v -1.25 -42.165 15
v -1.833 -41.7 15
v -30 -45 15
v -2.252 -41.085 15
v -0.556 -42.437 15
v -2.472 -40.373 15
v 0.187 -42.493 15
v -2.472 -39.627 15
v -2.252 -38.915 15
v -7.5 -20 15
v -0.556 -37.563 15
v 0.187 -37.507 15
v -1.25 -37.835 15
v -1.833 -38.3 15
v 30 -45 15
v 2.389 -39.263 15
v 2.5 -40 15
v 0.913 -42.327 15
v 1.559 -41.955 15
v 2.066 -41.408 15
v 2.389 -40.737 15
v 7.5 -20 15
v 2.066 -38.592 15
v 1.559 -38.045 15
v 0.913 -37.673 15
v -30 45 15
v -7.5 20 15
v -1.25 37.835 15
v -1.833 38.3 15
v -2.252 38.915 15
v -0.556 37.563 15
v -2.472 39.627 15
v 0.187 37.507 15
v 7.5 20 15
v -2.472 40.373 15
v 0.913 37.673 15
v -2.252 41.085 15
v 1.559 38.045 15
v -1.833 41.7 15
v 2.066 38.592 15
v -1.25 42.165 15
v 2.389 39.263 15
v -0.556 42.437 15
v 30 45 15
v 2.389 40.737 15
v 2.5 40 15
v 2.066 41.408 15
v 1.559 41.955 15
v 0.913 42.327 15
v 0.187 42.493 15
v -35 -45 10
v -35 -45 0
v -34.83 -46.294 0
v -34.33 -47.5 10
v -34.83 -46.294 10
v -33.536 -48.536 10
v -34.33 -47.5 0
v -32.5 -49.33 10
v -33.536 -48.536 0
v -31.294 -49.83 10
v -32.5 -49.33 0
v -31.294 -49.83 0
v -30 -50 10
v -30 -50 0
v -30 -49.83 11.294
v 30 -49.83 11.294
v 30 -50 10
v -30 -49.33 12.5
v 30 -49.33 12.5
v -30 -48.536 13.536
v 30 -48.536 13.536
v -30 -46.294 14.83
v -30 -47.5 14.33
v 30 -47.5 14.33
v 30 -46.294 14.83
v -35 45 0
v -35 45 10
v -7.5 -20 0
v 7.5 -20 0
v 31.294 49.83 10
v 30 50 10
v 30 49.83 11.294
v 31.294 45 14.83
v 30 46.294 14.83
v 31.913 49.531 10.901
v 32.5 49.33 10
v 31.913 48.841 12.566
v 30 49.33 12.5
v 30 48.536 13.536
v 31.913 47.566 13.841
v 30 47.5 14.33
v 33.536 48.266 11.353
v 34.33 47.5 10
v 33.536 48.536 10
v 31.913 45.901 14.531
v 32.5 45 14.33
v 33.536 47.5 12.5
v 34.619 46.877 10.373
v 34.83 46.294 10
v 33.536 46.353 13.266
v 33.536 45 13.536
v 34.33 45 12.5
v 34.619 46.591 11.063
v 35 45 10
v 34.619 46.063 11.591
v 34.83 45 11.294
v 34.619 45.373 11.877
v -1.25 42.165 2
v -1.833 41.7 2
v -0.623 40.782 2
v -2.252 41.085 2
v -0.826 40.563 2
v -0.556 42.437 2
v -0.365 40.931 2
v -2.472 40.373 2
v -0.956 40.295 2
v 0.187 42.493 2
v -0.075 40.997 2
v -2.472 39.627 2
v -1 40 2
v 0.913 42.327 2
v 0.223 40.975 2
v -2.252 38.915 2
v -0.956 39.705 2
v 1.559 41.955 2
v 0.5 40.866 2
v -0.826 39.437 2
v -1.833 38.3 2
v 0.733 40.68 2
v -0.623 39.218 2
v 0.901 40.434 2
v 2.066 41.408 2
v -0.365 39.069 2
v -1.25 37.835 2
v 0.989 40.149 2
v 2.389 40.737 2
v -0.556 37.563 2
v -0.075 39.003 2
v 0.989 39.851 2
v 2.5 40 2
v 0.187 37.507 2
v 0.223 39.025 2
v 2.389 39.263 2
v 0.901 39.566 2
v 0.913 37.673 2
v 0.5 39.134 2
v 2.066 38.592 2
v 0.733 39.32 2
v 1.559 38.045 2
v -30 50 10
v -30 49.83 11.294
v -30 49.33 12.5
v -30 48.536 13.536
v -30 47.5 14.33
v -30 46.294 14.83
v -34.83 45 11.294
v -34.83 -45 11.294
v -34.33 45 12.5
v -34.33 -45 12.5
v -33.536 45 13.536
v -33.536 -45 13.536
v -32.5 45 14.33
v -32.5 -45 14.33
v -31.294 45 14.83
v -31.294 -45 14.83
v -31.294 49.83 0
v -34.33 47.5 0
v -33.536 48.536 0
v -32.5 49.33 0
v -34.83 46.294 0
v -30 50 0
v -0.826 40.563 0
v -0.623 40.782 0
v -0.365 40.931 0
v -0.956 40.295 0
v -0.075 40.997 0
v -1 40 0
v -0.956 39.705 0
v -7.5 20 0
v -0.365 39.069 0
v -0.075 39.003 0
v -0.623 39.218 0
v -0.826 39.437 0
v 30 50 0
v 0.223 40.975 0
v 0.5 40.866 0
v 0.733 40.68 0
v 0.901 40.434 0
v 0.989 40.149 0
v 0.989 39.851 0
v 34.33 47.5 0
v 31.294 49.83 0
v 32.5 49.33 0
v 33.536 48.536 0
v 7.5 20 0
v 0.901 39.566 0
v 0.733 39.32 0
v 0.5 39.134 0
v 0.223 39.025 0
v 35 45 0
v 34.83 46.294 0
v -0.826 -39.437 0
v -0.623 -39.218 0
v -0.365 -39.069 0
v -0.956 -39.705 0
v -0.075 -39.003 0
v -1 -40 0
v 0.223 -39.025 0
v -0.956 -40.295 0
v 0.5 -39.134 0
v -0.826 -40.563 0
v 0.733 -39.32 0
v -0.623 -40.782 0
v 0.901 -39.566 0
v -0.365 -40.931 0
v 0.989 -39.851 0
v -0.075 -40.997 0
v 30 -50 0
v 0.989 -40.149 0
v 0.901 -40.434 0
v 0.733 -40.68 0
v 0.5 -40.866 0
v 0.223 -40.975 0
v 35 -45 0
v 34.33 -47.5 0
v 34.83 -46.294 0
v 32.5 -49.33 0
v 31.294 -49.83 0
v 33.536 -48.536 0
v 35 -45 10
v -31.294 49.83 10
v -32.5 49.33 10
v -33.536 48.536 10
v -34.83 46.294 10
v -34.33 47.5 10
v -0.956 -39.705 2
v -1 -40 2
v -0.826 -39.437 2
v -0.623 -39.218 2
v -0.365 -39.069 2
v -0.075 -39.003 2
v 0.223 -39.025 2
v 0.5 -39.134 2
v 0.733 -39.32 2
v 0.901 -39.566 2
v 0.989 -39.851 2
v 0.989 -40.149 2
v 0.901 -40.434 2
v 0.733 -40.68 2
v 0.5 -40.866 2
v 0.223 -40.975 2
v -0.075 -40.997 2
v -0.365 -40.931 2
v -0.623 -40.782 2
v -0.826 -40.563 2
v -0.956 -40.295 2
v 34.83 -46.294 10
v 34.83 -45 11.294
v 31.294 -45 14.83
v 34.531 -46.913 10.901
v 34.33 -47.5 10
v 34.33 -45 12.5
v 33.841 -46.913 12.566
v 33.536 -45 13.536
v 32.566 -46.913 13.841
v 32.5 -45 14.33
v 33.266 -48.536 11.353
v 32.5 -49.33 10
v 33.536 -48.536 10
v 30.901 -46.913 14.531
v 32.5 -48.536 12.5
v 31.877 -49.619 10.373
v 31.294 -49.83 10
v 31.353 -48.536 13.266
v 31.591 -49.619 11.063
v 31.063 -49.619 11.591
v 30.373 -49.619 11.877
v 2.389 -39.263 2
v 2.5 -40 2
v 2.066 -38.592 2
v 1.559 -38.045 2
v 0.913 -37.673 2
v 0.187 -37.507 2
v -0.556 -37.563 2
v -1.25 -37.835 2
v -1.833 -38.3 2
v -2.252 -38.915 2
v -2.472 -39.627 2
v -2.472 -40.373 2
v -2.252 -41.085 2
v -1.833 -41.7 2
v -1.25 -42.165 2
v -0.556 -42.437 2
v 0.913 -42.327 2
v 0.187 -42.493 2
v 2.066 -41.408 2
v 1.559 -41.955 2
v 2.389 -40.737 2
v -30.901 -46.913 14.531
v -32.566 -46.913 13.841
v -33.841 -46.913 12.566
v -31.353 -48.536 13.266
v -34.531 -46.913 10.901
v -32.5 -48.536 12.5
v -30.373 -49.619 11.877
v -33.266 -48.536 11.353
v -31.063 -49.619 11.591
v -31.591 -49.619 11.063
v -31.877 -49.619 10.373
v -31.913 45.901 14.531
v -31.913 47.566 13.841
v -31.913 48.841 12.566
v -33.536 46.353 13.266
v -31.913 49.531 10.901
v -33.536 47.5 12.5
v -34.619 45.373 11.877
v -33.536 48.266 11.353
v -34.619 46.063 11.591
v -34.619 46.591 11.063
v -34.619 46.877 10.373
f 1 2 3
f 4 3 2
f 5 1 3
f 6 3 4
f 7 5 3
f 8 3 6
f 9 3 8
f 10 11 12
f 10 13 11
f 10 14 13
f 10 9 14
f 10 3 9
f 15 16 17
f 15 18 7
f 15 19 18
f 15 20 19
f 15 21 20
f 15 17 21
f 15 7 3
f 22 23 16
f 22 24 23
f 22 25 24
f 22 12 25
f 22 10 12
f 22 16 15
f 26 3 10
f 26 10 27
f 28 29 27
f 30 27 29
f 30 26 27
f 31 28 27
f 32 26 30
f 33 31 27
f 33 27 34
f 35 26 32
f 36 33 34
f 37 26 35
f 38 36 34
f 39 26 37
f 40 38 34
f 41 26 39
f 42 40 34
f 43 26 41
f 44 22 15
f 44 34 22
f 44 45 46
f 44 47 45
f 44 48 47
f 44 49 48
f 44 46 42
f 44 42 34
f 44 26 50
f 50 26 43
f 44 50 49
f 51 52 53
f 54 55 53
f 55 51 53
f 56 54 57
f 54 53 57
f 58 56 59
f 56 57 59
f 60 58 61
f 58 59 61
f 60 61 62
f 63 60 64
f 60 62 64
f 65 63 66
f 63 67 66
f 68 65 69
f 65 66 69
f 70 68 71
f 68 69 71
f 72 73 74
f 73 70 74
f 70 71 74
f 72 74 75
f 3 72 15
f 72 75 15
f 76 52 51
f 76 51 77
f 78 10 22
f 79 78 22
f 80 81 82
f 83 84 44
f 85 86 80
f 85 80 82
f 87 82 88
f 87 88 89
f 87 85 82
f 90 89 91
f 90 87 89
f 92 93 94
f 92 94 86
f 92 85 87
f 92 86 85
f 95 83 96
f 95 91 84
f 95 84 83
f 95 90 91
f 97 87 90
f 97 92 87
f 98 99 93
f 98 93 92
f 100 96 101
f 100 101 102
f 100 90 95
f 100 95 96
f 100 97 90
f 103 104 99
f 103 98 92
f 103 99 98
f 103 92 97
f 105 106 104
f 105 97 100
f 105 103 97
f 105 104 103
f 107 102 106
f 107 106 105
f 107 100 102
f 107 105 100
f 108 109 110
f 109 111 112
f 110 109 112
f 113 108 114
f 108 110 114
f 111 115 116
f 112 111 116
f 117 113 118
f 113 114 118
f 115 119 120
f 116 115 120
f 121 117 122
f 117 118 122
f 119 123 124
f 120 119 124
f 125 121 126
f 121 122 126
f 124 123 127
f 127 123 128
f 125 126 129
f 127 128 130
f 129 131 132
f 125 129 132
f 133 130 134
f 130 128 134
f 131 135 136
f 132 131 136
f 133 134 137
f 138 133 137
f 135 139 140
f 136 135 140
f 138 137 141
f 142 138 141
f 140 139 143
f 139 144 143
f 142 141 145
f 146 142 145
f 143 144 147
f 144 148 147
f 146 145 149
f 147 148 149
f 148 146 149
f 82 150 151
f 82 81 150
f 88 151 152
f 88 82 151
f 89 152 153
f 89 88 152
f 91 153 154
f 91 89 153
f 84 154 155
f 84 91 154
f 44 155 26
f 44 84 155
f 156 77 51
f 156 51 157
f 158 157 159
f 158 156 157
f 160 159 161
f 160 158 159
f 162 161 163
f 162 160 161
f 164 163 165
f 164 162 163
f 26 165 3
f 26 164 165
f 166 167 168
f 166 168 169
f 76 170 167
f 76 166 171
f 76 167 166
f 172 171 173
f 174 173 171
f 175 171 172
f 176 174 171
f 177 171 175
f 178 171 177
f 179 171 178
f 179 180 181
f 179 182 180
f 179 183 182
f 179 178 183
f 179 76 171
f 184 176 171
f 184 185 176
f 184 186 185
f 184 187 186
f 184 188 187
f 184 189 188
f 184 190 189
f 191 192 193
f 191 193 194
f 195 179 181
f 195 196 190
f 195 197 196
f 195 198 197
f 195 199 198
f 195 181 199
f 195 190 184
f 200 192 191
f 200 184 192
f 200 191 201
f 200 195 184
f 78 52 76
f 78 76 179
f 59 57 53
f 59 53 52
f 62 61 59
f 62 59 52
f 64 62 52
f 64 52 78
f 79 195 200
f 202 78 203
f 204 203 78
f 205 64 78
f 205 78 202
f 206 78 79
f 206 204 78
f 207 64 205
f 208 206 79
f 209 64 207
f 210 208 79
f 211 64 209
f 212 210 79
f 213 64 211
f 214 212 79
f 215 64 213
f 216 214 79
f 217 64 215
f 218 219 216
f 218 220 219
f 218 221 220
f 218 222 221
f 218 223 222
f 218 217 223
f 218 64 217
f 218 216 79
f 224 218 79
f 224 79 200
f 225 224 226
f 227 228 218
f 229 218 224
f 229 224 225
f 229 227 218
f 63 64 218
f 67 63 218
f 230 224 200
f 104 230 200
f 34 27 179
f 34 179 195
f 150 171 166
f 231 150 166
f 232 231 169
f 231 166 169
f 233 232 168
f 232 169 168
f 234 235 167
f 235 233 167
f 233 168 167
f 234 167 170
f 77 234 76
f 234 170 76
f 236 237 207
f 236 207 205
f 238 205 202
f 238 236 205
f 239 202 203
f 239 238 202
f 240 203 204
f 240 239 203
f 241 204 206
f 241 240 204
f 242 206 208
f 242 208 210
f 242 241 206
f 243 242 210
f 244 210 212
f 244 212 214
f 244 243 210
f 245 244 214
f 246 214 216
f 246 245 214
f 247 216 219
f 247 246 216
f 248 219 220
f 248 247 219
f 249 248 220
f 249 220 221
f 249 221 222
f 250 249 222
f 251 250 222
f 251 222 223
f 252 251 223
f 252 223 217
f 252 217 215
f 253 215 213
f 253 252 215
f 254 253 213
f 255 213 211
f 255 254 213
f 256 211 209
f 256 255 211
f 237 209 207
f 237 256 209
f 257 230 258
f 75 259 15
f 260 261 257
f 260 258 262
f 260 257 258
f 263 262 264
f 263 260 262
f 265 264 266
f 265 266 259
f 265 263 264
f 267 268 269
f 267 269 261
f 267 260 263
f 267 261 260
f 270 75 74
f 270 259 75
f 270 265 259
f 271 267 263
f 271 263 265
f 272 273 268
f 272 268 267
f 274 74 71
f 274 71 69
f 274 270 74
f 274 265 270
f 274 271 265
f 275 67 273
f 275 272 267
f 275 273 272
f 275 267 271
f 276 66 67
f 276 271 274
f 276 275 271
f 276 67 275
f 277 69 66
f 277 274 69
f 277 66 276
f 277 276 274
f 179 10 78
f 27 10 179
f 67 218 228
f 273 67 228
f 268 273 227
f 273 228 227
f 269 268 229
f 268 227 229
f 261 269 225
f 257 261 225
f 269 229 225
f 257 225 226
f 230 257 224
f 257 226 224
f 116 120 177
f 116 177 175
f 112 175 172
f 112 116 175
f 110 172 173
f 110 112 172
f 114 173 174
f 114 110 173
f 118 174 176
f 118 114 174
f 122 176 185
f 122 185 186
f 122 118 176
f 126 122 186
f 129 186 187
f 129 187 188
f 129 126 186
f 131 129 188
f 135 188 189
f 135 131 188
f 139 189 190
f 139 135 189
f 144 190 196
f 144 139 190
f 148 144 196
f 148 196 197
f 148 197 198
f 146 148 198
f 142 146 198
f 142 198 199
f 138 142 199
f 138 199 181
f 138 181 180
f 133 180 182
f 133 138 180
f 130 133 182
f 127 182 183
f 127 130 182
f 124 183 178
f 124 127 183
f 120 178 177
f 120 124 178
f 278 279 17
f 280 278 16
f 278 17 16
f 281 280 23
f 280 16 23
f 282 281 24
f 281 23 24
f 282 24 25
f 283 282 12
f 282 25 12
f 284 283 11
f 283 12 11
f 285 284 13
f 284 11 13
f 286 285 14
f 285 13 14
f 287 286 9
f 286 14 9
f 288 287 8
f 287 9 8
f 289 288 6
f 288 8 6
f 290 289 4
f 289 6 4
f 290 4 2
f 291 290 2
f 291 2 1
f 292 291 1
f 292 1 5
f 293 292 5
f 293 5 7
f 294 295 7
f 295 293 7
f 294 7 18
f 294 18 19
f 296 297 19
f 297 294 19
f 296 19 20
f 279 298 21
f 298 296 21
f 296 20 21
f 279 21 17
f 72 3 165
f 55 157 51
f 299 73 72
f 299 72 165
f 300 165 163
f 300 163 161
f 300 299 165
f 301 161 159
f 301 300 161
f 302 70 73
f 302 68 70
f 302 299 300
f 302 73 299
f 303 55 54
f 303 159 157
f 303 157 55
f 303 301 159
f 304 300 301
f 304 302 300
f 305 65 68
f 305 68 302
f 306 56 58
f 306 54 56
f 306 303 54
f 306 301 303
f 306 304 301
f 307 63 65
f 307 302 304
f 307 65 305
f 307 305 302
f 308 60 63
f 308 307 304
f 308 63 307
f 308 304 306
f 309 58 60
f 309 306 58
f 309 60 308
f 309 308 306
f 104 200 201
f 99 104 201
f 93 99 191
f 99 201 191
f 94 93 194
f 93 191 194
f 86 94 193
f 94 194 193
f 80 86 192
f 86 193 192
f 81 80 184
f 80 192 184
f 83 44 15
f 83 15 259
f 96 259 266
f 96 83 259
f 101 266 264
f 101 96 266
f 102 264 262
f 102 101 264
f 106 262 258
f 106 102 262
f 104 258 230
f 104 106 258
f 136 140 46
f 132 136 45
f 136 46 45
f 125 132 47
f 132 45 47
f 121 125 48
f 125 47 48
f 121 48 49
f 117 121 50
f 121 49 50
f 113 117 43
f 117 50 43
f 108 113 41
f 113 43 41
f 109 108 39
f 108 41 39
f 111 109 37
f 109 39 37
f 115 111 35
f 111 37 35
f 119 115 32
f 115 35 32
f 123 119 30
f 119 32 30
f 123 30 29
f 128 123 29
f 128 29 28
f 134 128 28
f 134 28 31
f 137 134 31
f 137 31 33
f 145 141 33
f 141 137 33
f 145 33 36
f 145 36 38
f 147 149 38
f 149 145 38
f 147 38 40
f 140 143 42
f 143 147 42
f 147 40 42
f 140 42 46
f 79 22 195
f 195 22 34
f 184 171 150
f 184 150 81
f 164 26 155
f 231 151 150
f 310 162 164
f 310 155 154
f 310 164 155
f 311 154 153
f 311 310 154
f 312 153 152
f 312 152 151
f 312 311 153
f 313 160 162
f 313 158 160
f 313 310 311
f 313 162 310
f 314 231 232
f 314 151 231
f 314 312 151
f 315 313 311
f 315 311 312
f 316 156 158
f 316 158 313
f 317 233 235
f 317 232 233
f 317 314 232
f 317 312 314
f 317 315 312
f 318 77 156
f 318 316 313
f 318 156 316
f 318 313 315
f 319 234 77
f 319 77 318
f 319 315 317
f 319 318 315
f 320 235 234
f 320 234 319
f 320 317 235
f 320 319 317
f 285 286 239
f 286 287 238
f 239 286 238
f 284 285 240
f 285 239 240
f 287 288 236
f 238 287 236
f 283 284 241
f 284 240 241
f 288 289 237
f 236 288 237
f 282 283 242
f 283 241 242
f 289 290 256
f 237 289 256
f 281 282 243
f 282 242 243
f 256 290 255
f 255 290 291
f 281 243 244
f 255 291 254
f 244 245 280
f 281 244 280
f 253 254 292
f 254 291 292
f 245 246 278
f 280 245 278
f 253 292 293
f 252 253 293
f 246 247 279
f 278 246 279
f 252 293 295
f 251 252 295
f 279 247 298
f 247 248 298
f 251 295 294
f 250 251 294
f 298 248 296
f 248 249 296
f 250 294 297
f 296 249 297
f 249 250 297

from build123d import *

# Parameters (mm, degrees)
SKETCH1_W           = 70
SKETCH1_H           = 100
BOSS_EXTRUDE1_DEPTH = 15
SKETCH3_W           = 15
SKETCH3_H           = 40
CUT_EXTRUDE1_DEPTH  = 63.84902545
SKETCH4_R           = 2.5
CUT_EXTRUDE2_DEPTH  = 63.84902545
FILLET1_R           = 5
BOSS_EXTRUDE2_START = -2
SKETCH5_R           = 2.5
SKETCH5_R_2         = 1
BOSS_EXTRUDE2_DEPTH = 2
FILLET2_R           = 5


with BuildPart() as part:
    # Sketch1 → Boss-Extrude1 (new body)
    with BuildSketch(Plane.XY):
        Rectangle(SKETCH1_W, SKETCH1_H)
    extrude(amount=BOSS_EXTRUDE1_DEPTH)

    # Sketch3 → Cut-Extrude1 (cut, through all)
    with BuildSketch(Plane.XY.offset(15)):
        Rectangle(SKETCH3_W, SKETCH3_H)
    extrude(amount=-CUT_EXTRUDE1_DEPTH, mode=Mode.SUBTRACT)

    # Sketch4 → Cut-Extrude2 (cut, through all)
    with BuildSketch(Plane.XY.offset(15)):
        with Locations((0, -40)):
            Circle(SKETCH4_R)
        with Locations((0, 40)):
            Circle(SKETCH4_R)
    extrude(amount=-CUT_EXTRUDE2_DEPTH, mode=Mode.SUBTRACT)

    # Fillet1
    fillet1_edges = [part.edges().sort_by_distance(p)[0] for p in [
        (-35, 0, 15),
        (0, -50, 15),
        (35, 0, 15),
        (0, 50, 15),
    ]]
    fillet(fillet1_edges, radius=FILLET1_R)

    # Sketch5 → Boss-Extrude2 (add)
    # profile 1 of 2: a face of its own
    with BuildSketch(Plane(origin=(0, 0, 0), x_dir=(-1, 0, 0), z_dir=(0, 0, -1)).offset(BOSS_EXTRUDE2_START)):
        with Locations(Location((0, 40, 0), (0, 0, 180))):
            Circle(SKETCH5_R)
        with Locations((0, 40)):
            Circle(SKETCH5_R_2, mode=Mode.SUBTRACT)
    # profile 2 of 2: a face of its own
    with BuildSketch(Plane(origin=(0, 0, 0), x_dir=(-1, 0, 0), z_dir=(0, 0, -1)).offset(BOSS_EXTRUDE2_START)):
        with Locations(Location((0, -40, 0), (0, 0, 180))):
            Circle(SKETCH5_R)
        with Locations((0, -40)):
            Circle(SKETCH5_R_2, mode=Mode.SUBTRACT)
    extrude(amount=BOSS_EXTRUDE2_DEPTH)

    # Fillet2
    # the kernel refuses this fillet: 5 mm, written as the material it takes off along each edge
    with BuildSketch(Plane(origin=(-30, 45, 10), x_dir=(0, 1, 0), z_dir=(-1, 0, 0))) as fillet2_piece_1_section:
        Polygon((0, 0), (FILLET2_R, 0), (FILLET2_R, -FILLET2_R), (0, -FILLET2_R), align=None)
    fillet2_piece_1 = extrude(amount=FILLET2_R, mode=Mode.PRIVATE)
    fillet2_piece_1 = fillet2_piece_1 - Plane(origin=(-30, 45, 10), x_dir=(0, -0.7071067811865475, -0.7071067811865475), z_dir=(-1, 0, 0)) * Sphere(FILLET2_R, mode=Mode.PRIVATE)
    add(fillet2_piece_1, mode=Mode.SUBTRACT)
    with BuildSketch(Plane(origin=(30, 45, 10), x_dir=(0, 1, 0), z_dir=(1, 0, 0))) as fillet2_piece_2_section:
        Polygon((0, 0), (FILLET2_R, 0), (FILLET2_R, FILLET2_R), (0, FILLET2_R), align=None)
    fillet2_piece_2 = extrude(amount=FILLET2_R, mode=Mode.PRIVATE)
    fillet2_piece_2 = fillet2_piece_2 - Plane(origin=(30, 45, 10), x_dir=(0, -0.7071067811865475, -0.7071067811865475), z_dir=(1, 0, 0)) * Sphere(FILLET2_R, mode=Mode.PRIVATE)
    add(fillet2_piece_2, mode=Mode.SUBTRACT)
    with BuildSketch(Plane(origin=(-30, -45, 10), x_dir=(-1, 0, 0), z_dir=(0, -1, 0))) as fillet2_piece_3_section:
        Polygon((0, 0), (FILLET2_R, 0), (FILLET2_R, -FILLET2_R), (0, -FILLET2_R), align=None)
    fillet2_piece_3 = extrude(amount=FILLET2_R, mode=Mode.PRIVATE)
    fillet2_piece_3 = fillet2_piece_3 - Plane(origin=(-30, -45, 10), x_dir=(0.7071067811865475, 0, -0.7071067811865475), z_dir=(0, -1, 0)) * Sphere(FILLET2_R, mode=Mode.PRIVATE)
    add(fillet2_piece_3, mode=Mode.SUBTRACT)
    with BuildSketch(Plane(origin=(30, -45, 10), x_dir=(1, 0, 0), z_dir=(0, -1, 0))) as fillet2_piece_4_section:
        Polygon((0, 0), (FILLET2_R, 0), (FILLET2_R, FILLET2_R), (0, FILLET2_R), align=None)
    fillet2_piece_4 = extrude(amount=FILLET2_R, mode=Mode.PRIVATE)
    fillet2_piece_4 = fillet2_piece_4 - Plane(origin=(30, -45, 10), x_dir=(-0.7071067811865475, 0, -0.7071067811865475), z_dir=(0, -1, 0)) * Sphere(FILLET2_R, mode=Mode.PRIVATE)
    add(fillet2_piece_4, mode=Mode.SUBTRACT)
    with BuildSketch(Plane(origin=(35, -50, -12.5), x_dir=(-1, 0, 0), z_dir=(0, 0, 1)), Plane(origin=(35, 50, -12.5), x_dir=(0, -1, 0), z_dir=(0, 0, 1))) as fillet2_piece_5:
        with BuildLine():
            CenterArc((FILLET2_R, -FILLET2_R), FILLET2_R, 90, 90)
            Line((0, -FILLET2_R), (0, 0))
            Line((0, 0), (FILLET2_R, 0))
        make_face()
    extrude(amount=22.5, mode=Mode.SUBTRACT)
    with BuildSketch(Plane(origin=(-35, -50, -12.5), x_dir=(1, 0, 0), z_dir=(0, 0, 1)), Plane(origin=(-35, 50, -12.5), x_dir=(0, -1, 0), z_dir=(0, 0, 1))) as fillet2_piece_6:
        with BuildLine():
            CenterArc((FILLET2_R, FILLET2_R), FILLET2_R, 180, 90)
            Line((0, FILLET2_R), (0, 0))
            Line((0, 0), (FILLET2_R, 0))
        make_face()
    extrude(amount=22.5, mode=Mode.SUBTRACT)


solid = part.part
